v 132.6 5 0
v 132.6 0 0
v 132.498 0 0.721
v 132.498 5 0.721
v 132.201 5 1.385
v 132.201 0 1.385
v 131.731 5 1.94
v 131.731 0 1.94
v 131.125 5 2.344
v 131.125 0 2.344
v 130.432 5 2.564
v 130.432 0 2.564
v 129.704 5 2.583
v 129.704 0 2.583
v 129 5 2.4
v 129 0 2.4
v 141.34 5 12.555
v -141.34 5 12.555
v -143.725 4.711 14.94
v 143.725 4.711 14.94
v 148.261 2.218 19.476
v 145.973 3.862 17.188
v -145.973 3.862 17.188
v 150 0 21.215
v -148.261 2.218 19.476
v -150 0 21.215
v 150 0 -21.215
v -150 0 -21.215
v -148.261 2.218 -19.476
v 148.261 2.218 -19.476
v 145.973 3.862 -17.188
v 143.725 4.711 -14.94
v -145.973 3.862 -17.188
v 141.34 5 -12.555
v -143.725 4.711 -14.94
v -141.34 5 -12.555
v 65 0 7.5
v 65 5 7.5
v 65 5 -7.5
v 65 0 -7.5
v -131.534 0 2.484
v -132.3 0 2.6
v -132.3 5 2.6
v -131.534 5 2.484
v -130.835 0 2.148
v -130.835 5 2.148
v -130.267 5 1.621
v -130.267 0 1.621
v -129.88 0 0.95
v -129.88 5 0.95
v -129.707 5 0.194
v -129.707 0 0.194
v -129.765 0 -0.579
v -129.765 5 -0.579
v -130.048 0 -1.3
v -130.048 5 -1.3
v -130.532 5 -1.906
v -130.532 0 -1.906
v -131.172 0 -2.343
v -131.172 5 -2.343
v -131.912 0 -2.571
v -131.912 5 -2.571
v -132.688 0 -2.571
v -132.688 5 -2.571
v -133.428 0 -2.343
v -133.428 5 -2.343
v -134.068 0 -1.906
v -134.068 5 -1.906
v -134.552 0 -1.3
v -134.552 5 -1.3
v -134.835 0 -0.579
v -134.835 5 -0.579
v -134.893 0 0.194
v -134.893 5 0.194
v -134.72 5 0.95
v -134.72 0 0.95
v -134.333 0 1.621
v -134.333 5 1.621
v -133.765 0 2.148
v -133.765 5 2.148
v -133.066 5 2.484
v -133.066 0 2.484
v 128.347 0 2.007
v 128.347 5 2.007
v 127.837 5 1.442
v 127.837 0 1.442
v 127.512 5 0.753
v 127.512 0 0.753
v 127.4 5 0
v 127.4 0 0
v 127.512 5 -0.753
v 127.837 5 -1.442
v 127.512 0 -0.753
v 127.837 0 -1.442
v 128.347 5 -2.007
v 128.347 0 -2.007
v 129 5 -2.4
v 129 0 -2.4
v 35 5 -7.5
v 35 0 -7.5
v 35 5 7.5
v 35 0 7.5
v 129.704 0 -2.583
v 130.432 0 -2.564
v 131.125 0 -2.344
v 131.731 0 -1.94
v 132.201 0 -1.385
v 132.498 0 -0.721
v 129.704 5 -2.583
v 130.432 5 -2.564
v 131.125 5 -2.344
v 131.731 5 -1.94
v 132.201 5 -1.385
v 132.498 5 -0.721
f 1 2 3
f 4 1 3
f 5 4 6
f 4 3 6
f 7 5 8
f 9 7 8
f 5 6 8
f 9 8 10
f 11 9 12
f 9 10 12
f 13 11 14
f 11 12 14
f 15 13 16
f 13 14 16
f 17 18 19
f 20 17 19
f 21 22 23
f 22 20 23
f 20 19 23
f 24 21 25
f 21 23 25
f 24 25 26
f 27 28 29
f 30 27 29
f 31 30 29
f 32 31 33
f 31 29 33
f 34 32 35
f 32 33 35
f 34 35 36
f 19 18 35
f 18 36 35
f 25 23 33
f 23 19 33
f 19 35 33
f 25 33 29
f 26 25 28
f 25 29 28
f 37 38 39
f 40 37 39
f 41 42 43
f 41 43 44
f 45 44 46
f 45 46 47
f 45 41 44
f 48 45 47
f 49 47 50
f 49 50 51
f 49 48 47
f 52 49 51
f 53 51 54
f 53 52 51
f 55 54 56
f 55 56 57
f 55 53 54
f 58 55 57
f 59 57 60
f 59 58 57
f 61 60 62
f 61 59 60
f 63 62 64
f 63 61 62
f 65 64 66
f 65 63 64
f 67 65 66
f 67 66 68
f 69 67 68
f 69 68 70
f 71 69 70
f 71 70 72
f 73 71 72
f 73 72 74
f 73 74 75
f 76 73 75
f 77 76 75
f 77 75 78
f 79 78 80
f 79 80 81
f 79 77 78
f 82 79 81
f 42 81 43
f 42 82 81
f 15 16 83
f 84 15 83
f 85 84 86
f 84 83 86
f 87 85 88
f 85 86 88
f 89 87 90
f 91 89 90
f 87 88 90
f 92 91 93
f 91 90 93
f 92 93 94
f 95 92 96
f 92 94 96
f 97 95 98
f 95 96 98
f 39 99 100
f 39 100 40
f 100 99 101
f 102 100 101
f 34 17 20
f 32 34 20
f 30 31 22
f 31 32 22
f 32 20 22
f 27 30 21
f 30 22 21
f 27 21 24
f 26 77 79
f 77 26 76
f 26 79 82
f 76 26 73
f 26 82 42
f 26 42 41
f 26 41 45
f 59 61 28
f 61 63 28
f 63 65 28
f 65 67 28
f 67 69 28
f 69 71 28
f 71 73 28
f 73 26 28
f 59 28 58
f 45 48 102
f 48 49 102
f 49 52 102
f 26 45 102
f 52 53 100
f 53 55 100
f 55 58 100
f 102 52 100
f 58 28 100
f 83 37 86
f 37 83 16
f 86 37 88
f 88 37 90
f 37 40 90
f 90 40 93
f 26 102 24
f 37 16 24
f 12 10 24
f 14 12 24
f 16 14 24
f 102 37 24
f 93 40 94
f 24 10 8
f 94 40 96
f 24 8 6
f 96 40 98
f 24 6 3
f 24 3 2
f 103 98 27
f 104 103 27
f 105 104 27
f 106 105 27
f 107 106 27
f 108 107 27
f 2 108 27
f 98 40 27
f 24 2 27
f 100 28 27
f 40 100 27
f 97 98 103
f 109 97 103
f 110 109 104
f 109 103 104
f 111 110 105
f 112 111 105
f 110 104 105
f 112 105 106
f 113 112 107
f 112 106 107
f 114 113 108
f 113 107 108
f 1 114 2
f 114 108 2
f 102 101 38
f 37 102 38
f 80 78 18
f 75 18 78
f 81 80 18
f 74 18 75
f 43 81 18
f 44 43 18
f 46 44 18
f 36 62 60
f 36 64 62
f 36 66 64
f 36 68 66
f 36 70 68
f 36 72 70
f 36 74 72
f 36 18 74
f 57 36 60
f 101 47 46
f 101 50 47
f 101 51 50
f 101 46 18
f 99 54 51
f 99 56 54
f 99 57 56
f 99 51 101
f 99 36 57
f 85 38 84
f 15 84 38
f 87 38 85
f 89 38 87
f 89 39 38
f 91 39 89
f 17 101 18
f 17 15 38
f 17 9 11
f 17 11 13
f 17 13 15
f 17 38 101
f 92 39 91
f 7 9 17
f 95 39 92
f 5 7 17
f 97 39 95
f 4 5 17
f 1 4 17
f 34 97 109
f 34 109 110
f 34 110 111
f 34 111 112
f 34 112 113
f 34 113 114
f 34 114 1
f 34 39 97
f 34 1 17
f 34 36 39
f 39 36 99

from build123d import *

# Parameters (mm, degrees)
SKETCH_1_W          = 21
SKETCH_1_H          = 42.43
SKETCH_1_R          = 2.6
EXTRUDE_1_DEPTH     = 5
FILLET_1_R          = 10
SKETCH_3_W          = 30
SKETCH_3_H          = 7.5
CUT_EXTRUDE_2_DEPTH = 5


with BuildPart() as part:
    # 草图1 → 凸台-拉伸1 (new body)
    # profile 1 of 3: a face of its own
    with BuildSketch(Plane(origin=(0, 0, 0), x_dir=(1, 0, 0), z_dir=(0, 1, 0))):
        with Locations((-139.5, 0)):
            Rectangle(SKETCH_1_W, SKETCH_1_H)
        with Locations(Location((-132.3, 0, 0), (0, 0, 270))):
            Circle(SKETCH_1_R, mode=Mode.SUBTRACT)
    # profile 2 of 3: a face of its own
    with BuildSketch(Plane(origin=(0, 0, 0), x_dir=(1, 0, 0), z_dir=(0, 1, 0))):
        with BuildLine():
            Line((129, 21.215), (-129, 21.215))
            Line((-129, 21.215), (-129, -21.215))
            Line((-129, -21.215), (129, -21.215))
            Line((129, -21.215), (129, -2.4))
            ThreePointArc((129, -2.4), (127.4, 0), (129, 2.4))
            Line((129, 2.4), (129, 21.215))
        make_face()
    # profile 3 of 3: a face of its own
    with BuildSketch(Plane(origin=(0, 0, 0), x_dir=(1, 0, 0), z_dir=(0, 1, 0))):
        with BuildLine():
            Line((150, 21.215), (129, 21.215))
            Line((129, 21.215), (129, 2.4))
            ThreePointArc((129, 2.4), (131.44222051, 2.163330765), (132.6, 0))
            ThreePointArc((132.6, 0), (131.44222051, -2.163330765), (129, -2.4))
            Line((129, -2.4), (129, -21.215))
            Line((129, -21.215), (150, -21.215))
            Line((150, -21.215), (150, 21.215))
        make_face()
    extrude(amount=EXTRUDE_1_DEPTH)

    # 圆角1
    # the kernel refuses this fillet: 10 mm, written as the material it takes off along each edge
    with BuildSketch(Plane(origin=(150, 5, 42.865635095), x_dir=(-1, 0, 0), z_dir=(0, 0, -1)), Plane(origin=(-150, 5, -42.865635095), x_dir=(1, 0, 0), z_dir=(0, 0, 1))) as fillet_1_piece_1:
        with BuildLine():
            CenterArc((8.660254038, -10), FILLET_1_R, 90, 60)
            Line((0, -5), (-0.173205081, -4.9))
            ThreePointArc((-0.173205081, -4.9), (-0.2, -2.5), (-0.2, 0))
            Line((-0.2, 0), (0, 0.2))
            Line((0, 0.2), (8.660254038, 0.2))
            Line((8.660254038, 0.2), (8.660254038, 0))
        make_face()
    extrude(amount=85.731270189, mode=Mode.SUBTRACT)
    with BuildSketch(Plane(origin=(-171.650635095, 5, 21.215), x_dir=(0, 0, -1), z_dir=(1, 0, 0))) as fillet_1_piece_2:
        with BuildLine():
            CenterArc((8.660254038, -10), FILLET_1_R, 90, 60)
            Line((0, -5), (-0.173205081, -4.9))
            ThreePointArc((-0.173205081, -4.9), (-0.2, -2.5), (-0.2, 0))
            Line((-0.2, 0), (0, 0.2))
            Line((0, 0.2), (8.660254038, 0.2))
            Line((8.660254038, 0.2), (8.660254038, 0))
        make_face()
    extrude(amount=343.301270189, mode=Mode.SUBTRACT)
    with BuildSketch(Plane(origin=(-171.650635095, 5, -21.215), x_dir=(0, -1, 0), z_dir=(1, 0, 0))) as fillet_1_piece_3:
        with BuildLine():
            CenterArc((10, -8.660254038), FILLET_1_R, 120, 60)
            Line((0, -8.660254038), (-0.2, -8.660254038))
            Line((-0.2, -8.660254038), (-0.2, 0))
            Line((-0.2, 0), (0, 0.2))
            ThreePointArc((0, 0.2), (2.5, 0.2), (4.9, 0.173205081))
            Line((4.9, 0.173205081), (5, 0))
        make_face()
    extrude(amount=343.301270189, mode=Mode.SUBTRACT)

    # 草图3 → 切除-拉伸2 (cut)
    with BuildSketch(Plane(origin=(0, 5, 0), x_dir=(1, 0, 0), z_dir=(0, 1, 0))):
        with Locations((50, 3.75)):
            Rectangle(SKETCH_3_W, SKETCH_3_H)
        with Locations((50, -3.75)):
            Rectangle(SKETCH_3_W, SKETCH_3_H)
    extrude(amount=-CUT_EXTRUDE_2_DEPTH, mode=Mode.SUBTRACT)


solid = part.part
